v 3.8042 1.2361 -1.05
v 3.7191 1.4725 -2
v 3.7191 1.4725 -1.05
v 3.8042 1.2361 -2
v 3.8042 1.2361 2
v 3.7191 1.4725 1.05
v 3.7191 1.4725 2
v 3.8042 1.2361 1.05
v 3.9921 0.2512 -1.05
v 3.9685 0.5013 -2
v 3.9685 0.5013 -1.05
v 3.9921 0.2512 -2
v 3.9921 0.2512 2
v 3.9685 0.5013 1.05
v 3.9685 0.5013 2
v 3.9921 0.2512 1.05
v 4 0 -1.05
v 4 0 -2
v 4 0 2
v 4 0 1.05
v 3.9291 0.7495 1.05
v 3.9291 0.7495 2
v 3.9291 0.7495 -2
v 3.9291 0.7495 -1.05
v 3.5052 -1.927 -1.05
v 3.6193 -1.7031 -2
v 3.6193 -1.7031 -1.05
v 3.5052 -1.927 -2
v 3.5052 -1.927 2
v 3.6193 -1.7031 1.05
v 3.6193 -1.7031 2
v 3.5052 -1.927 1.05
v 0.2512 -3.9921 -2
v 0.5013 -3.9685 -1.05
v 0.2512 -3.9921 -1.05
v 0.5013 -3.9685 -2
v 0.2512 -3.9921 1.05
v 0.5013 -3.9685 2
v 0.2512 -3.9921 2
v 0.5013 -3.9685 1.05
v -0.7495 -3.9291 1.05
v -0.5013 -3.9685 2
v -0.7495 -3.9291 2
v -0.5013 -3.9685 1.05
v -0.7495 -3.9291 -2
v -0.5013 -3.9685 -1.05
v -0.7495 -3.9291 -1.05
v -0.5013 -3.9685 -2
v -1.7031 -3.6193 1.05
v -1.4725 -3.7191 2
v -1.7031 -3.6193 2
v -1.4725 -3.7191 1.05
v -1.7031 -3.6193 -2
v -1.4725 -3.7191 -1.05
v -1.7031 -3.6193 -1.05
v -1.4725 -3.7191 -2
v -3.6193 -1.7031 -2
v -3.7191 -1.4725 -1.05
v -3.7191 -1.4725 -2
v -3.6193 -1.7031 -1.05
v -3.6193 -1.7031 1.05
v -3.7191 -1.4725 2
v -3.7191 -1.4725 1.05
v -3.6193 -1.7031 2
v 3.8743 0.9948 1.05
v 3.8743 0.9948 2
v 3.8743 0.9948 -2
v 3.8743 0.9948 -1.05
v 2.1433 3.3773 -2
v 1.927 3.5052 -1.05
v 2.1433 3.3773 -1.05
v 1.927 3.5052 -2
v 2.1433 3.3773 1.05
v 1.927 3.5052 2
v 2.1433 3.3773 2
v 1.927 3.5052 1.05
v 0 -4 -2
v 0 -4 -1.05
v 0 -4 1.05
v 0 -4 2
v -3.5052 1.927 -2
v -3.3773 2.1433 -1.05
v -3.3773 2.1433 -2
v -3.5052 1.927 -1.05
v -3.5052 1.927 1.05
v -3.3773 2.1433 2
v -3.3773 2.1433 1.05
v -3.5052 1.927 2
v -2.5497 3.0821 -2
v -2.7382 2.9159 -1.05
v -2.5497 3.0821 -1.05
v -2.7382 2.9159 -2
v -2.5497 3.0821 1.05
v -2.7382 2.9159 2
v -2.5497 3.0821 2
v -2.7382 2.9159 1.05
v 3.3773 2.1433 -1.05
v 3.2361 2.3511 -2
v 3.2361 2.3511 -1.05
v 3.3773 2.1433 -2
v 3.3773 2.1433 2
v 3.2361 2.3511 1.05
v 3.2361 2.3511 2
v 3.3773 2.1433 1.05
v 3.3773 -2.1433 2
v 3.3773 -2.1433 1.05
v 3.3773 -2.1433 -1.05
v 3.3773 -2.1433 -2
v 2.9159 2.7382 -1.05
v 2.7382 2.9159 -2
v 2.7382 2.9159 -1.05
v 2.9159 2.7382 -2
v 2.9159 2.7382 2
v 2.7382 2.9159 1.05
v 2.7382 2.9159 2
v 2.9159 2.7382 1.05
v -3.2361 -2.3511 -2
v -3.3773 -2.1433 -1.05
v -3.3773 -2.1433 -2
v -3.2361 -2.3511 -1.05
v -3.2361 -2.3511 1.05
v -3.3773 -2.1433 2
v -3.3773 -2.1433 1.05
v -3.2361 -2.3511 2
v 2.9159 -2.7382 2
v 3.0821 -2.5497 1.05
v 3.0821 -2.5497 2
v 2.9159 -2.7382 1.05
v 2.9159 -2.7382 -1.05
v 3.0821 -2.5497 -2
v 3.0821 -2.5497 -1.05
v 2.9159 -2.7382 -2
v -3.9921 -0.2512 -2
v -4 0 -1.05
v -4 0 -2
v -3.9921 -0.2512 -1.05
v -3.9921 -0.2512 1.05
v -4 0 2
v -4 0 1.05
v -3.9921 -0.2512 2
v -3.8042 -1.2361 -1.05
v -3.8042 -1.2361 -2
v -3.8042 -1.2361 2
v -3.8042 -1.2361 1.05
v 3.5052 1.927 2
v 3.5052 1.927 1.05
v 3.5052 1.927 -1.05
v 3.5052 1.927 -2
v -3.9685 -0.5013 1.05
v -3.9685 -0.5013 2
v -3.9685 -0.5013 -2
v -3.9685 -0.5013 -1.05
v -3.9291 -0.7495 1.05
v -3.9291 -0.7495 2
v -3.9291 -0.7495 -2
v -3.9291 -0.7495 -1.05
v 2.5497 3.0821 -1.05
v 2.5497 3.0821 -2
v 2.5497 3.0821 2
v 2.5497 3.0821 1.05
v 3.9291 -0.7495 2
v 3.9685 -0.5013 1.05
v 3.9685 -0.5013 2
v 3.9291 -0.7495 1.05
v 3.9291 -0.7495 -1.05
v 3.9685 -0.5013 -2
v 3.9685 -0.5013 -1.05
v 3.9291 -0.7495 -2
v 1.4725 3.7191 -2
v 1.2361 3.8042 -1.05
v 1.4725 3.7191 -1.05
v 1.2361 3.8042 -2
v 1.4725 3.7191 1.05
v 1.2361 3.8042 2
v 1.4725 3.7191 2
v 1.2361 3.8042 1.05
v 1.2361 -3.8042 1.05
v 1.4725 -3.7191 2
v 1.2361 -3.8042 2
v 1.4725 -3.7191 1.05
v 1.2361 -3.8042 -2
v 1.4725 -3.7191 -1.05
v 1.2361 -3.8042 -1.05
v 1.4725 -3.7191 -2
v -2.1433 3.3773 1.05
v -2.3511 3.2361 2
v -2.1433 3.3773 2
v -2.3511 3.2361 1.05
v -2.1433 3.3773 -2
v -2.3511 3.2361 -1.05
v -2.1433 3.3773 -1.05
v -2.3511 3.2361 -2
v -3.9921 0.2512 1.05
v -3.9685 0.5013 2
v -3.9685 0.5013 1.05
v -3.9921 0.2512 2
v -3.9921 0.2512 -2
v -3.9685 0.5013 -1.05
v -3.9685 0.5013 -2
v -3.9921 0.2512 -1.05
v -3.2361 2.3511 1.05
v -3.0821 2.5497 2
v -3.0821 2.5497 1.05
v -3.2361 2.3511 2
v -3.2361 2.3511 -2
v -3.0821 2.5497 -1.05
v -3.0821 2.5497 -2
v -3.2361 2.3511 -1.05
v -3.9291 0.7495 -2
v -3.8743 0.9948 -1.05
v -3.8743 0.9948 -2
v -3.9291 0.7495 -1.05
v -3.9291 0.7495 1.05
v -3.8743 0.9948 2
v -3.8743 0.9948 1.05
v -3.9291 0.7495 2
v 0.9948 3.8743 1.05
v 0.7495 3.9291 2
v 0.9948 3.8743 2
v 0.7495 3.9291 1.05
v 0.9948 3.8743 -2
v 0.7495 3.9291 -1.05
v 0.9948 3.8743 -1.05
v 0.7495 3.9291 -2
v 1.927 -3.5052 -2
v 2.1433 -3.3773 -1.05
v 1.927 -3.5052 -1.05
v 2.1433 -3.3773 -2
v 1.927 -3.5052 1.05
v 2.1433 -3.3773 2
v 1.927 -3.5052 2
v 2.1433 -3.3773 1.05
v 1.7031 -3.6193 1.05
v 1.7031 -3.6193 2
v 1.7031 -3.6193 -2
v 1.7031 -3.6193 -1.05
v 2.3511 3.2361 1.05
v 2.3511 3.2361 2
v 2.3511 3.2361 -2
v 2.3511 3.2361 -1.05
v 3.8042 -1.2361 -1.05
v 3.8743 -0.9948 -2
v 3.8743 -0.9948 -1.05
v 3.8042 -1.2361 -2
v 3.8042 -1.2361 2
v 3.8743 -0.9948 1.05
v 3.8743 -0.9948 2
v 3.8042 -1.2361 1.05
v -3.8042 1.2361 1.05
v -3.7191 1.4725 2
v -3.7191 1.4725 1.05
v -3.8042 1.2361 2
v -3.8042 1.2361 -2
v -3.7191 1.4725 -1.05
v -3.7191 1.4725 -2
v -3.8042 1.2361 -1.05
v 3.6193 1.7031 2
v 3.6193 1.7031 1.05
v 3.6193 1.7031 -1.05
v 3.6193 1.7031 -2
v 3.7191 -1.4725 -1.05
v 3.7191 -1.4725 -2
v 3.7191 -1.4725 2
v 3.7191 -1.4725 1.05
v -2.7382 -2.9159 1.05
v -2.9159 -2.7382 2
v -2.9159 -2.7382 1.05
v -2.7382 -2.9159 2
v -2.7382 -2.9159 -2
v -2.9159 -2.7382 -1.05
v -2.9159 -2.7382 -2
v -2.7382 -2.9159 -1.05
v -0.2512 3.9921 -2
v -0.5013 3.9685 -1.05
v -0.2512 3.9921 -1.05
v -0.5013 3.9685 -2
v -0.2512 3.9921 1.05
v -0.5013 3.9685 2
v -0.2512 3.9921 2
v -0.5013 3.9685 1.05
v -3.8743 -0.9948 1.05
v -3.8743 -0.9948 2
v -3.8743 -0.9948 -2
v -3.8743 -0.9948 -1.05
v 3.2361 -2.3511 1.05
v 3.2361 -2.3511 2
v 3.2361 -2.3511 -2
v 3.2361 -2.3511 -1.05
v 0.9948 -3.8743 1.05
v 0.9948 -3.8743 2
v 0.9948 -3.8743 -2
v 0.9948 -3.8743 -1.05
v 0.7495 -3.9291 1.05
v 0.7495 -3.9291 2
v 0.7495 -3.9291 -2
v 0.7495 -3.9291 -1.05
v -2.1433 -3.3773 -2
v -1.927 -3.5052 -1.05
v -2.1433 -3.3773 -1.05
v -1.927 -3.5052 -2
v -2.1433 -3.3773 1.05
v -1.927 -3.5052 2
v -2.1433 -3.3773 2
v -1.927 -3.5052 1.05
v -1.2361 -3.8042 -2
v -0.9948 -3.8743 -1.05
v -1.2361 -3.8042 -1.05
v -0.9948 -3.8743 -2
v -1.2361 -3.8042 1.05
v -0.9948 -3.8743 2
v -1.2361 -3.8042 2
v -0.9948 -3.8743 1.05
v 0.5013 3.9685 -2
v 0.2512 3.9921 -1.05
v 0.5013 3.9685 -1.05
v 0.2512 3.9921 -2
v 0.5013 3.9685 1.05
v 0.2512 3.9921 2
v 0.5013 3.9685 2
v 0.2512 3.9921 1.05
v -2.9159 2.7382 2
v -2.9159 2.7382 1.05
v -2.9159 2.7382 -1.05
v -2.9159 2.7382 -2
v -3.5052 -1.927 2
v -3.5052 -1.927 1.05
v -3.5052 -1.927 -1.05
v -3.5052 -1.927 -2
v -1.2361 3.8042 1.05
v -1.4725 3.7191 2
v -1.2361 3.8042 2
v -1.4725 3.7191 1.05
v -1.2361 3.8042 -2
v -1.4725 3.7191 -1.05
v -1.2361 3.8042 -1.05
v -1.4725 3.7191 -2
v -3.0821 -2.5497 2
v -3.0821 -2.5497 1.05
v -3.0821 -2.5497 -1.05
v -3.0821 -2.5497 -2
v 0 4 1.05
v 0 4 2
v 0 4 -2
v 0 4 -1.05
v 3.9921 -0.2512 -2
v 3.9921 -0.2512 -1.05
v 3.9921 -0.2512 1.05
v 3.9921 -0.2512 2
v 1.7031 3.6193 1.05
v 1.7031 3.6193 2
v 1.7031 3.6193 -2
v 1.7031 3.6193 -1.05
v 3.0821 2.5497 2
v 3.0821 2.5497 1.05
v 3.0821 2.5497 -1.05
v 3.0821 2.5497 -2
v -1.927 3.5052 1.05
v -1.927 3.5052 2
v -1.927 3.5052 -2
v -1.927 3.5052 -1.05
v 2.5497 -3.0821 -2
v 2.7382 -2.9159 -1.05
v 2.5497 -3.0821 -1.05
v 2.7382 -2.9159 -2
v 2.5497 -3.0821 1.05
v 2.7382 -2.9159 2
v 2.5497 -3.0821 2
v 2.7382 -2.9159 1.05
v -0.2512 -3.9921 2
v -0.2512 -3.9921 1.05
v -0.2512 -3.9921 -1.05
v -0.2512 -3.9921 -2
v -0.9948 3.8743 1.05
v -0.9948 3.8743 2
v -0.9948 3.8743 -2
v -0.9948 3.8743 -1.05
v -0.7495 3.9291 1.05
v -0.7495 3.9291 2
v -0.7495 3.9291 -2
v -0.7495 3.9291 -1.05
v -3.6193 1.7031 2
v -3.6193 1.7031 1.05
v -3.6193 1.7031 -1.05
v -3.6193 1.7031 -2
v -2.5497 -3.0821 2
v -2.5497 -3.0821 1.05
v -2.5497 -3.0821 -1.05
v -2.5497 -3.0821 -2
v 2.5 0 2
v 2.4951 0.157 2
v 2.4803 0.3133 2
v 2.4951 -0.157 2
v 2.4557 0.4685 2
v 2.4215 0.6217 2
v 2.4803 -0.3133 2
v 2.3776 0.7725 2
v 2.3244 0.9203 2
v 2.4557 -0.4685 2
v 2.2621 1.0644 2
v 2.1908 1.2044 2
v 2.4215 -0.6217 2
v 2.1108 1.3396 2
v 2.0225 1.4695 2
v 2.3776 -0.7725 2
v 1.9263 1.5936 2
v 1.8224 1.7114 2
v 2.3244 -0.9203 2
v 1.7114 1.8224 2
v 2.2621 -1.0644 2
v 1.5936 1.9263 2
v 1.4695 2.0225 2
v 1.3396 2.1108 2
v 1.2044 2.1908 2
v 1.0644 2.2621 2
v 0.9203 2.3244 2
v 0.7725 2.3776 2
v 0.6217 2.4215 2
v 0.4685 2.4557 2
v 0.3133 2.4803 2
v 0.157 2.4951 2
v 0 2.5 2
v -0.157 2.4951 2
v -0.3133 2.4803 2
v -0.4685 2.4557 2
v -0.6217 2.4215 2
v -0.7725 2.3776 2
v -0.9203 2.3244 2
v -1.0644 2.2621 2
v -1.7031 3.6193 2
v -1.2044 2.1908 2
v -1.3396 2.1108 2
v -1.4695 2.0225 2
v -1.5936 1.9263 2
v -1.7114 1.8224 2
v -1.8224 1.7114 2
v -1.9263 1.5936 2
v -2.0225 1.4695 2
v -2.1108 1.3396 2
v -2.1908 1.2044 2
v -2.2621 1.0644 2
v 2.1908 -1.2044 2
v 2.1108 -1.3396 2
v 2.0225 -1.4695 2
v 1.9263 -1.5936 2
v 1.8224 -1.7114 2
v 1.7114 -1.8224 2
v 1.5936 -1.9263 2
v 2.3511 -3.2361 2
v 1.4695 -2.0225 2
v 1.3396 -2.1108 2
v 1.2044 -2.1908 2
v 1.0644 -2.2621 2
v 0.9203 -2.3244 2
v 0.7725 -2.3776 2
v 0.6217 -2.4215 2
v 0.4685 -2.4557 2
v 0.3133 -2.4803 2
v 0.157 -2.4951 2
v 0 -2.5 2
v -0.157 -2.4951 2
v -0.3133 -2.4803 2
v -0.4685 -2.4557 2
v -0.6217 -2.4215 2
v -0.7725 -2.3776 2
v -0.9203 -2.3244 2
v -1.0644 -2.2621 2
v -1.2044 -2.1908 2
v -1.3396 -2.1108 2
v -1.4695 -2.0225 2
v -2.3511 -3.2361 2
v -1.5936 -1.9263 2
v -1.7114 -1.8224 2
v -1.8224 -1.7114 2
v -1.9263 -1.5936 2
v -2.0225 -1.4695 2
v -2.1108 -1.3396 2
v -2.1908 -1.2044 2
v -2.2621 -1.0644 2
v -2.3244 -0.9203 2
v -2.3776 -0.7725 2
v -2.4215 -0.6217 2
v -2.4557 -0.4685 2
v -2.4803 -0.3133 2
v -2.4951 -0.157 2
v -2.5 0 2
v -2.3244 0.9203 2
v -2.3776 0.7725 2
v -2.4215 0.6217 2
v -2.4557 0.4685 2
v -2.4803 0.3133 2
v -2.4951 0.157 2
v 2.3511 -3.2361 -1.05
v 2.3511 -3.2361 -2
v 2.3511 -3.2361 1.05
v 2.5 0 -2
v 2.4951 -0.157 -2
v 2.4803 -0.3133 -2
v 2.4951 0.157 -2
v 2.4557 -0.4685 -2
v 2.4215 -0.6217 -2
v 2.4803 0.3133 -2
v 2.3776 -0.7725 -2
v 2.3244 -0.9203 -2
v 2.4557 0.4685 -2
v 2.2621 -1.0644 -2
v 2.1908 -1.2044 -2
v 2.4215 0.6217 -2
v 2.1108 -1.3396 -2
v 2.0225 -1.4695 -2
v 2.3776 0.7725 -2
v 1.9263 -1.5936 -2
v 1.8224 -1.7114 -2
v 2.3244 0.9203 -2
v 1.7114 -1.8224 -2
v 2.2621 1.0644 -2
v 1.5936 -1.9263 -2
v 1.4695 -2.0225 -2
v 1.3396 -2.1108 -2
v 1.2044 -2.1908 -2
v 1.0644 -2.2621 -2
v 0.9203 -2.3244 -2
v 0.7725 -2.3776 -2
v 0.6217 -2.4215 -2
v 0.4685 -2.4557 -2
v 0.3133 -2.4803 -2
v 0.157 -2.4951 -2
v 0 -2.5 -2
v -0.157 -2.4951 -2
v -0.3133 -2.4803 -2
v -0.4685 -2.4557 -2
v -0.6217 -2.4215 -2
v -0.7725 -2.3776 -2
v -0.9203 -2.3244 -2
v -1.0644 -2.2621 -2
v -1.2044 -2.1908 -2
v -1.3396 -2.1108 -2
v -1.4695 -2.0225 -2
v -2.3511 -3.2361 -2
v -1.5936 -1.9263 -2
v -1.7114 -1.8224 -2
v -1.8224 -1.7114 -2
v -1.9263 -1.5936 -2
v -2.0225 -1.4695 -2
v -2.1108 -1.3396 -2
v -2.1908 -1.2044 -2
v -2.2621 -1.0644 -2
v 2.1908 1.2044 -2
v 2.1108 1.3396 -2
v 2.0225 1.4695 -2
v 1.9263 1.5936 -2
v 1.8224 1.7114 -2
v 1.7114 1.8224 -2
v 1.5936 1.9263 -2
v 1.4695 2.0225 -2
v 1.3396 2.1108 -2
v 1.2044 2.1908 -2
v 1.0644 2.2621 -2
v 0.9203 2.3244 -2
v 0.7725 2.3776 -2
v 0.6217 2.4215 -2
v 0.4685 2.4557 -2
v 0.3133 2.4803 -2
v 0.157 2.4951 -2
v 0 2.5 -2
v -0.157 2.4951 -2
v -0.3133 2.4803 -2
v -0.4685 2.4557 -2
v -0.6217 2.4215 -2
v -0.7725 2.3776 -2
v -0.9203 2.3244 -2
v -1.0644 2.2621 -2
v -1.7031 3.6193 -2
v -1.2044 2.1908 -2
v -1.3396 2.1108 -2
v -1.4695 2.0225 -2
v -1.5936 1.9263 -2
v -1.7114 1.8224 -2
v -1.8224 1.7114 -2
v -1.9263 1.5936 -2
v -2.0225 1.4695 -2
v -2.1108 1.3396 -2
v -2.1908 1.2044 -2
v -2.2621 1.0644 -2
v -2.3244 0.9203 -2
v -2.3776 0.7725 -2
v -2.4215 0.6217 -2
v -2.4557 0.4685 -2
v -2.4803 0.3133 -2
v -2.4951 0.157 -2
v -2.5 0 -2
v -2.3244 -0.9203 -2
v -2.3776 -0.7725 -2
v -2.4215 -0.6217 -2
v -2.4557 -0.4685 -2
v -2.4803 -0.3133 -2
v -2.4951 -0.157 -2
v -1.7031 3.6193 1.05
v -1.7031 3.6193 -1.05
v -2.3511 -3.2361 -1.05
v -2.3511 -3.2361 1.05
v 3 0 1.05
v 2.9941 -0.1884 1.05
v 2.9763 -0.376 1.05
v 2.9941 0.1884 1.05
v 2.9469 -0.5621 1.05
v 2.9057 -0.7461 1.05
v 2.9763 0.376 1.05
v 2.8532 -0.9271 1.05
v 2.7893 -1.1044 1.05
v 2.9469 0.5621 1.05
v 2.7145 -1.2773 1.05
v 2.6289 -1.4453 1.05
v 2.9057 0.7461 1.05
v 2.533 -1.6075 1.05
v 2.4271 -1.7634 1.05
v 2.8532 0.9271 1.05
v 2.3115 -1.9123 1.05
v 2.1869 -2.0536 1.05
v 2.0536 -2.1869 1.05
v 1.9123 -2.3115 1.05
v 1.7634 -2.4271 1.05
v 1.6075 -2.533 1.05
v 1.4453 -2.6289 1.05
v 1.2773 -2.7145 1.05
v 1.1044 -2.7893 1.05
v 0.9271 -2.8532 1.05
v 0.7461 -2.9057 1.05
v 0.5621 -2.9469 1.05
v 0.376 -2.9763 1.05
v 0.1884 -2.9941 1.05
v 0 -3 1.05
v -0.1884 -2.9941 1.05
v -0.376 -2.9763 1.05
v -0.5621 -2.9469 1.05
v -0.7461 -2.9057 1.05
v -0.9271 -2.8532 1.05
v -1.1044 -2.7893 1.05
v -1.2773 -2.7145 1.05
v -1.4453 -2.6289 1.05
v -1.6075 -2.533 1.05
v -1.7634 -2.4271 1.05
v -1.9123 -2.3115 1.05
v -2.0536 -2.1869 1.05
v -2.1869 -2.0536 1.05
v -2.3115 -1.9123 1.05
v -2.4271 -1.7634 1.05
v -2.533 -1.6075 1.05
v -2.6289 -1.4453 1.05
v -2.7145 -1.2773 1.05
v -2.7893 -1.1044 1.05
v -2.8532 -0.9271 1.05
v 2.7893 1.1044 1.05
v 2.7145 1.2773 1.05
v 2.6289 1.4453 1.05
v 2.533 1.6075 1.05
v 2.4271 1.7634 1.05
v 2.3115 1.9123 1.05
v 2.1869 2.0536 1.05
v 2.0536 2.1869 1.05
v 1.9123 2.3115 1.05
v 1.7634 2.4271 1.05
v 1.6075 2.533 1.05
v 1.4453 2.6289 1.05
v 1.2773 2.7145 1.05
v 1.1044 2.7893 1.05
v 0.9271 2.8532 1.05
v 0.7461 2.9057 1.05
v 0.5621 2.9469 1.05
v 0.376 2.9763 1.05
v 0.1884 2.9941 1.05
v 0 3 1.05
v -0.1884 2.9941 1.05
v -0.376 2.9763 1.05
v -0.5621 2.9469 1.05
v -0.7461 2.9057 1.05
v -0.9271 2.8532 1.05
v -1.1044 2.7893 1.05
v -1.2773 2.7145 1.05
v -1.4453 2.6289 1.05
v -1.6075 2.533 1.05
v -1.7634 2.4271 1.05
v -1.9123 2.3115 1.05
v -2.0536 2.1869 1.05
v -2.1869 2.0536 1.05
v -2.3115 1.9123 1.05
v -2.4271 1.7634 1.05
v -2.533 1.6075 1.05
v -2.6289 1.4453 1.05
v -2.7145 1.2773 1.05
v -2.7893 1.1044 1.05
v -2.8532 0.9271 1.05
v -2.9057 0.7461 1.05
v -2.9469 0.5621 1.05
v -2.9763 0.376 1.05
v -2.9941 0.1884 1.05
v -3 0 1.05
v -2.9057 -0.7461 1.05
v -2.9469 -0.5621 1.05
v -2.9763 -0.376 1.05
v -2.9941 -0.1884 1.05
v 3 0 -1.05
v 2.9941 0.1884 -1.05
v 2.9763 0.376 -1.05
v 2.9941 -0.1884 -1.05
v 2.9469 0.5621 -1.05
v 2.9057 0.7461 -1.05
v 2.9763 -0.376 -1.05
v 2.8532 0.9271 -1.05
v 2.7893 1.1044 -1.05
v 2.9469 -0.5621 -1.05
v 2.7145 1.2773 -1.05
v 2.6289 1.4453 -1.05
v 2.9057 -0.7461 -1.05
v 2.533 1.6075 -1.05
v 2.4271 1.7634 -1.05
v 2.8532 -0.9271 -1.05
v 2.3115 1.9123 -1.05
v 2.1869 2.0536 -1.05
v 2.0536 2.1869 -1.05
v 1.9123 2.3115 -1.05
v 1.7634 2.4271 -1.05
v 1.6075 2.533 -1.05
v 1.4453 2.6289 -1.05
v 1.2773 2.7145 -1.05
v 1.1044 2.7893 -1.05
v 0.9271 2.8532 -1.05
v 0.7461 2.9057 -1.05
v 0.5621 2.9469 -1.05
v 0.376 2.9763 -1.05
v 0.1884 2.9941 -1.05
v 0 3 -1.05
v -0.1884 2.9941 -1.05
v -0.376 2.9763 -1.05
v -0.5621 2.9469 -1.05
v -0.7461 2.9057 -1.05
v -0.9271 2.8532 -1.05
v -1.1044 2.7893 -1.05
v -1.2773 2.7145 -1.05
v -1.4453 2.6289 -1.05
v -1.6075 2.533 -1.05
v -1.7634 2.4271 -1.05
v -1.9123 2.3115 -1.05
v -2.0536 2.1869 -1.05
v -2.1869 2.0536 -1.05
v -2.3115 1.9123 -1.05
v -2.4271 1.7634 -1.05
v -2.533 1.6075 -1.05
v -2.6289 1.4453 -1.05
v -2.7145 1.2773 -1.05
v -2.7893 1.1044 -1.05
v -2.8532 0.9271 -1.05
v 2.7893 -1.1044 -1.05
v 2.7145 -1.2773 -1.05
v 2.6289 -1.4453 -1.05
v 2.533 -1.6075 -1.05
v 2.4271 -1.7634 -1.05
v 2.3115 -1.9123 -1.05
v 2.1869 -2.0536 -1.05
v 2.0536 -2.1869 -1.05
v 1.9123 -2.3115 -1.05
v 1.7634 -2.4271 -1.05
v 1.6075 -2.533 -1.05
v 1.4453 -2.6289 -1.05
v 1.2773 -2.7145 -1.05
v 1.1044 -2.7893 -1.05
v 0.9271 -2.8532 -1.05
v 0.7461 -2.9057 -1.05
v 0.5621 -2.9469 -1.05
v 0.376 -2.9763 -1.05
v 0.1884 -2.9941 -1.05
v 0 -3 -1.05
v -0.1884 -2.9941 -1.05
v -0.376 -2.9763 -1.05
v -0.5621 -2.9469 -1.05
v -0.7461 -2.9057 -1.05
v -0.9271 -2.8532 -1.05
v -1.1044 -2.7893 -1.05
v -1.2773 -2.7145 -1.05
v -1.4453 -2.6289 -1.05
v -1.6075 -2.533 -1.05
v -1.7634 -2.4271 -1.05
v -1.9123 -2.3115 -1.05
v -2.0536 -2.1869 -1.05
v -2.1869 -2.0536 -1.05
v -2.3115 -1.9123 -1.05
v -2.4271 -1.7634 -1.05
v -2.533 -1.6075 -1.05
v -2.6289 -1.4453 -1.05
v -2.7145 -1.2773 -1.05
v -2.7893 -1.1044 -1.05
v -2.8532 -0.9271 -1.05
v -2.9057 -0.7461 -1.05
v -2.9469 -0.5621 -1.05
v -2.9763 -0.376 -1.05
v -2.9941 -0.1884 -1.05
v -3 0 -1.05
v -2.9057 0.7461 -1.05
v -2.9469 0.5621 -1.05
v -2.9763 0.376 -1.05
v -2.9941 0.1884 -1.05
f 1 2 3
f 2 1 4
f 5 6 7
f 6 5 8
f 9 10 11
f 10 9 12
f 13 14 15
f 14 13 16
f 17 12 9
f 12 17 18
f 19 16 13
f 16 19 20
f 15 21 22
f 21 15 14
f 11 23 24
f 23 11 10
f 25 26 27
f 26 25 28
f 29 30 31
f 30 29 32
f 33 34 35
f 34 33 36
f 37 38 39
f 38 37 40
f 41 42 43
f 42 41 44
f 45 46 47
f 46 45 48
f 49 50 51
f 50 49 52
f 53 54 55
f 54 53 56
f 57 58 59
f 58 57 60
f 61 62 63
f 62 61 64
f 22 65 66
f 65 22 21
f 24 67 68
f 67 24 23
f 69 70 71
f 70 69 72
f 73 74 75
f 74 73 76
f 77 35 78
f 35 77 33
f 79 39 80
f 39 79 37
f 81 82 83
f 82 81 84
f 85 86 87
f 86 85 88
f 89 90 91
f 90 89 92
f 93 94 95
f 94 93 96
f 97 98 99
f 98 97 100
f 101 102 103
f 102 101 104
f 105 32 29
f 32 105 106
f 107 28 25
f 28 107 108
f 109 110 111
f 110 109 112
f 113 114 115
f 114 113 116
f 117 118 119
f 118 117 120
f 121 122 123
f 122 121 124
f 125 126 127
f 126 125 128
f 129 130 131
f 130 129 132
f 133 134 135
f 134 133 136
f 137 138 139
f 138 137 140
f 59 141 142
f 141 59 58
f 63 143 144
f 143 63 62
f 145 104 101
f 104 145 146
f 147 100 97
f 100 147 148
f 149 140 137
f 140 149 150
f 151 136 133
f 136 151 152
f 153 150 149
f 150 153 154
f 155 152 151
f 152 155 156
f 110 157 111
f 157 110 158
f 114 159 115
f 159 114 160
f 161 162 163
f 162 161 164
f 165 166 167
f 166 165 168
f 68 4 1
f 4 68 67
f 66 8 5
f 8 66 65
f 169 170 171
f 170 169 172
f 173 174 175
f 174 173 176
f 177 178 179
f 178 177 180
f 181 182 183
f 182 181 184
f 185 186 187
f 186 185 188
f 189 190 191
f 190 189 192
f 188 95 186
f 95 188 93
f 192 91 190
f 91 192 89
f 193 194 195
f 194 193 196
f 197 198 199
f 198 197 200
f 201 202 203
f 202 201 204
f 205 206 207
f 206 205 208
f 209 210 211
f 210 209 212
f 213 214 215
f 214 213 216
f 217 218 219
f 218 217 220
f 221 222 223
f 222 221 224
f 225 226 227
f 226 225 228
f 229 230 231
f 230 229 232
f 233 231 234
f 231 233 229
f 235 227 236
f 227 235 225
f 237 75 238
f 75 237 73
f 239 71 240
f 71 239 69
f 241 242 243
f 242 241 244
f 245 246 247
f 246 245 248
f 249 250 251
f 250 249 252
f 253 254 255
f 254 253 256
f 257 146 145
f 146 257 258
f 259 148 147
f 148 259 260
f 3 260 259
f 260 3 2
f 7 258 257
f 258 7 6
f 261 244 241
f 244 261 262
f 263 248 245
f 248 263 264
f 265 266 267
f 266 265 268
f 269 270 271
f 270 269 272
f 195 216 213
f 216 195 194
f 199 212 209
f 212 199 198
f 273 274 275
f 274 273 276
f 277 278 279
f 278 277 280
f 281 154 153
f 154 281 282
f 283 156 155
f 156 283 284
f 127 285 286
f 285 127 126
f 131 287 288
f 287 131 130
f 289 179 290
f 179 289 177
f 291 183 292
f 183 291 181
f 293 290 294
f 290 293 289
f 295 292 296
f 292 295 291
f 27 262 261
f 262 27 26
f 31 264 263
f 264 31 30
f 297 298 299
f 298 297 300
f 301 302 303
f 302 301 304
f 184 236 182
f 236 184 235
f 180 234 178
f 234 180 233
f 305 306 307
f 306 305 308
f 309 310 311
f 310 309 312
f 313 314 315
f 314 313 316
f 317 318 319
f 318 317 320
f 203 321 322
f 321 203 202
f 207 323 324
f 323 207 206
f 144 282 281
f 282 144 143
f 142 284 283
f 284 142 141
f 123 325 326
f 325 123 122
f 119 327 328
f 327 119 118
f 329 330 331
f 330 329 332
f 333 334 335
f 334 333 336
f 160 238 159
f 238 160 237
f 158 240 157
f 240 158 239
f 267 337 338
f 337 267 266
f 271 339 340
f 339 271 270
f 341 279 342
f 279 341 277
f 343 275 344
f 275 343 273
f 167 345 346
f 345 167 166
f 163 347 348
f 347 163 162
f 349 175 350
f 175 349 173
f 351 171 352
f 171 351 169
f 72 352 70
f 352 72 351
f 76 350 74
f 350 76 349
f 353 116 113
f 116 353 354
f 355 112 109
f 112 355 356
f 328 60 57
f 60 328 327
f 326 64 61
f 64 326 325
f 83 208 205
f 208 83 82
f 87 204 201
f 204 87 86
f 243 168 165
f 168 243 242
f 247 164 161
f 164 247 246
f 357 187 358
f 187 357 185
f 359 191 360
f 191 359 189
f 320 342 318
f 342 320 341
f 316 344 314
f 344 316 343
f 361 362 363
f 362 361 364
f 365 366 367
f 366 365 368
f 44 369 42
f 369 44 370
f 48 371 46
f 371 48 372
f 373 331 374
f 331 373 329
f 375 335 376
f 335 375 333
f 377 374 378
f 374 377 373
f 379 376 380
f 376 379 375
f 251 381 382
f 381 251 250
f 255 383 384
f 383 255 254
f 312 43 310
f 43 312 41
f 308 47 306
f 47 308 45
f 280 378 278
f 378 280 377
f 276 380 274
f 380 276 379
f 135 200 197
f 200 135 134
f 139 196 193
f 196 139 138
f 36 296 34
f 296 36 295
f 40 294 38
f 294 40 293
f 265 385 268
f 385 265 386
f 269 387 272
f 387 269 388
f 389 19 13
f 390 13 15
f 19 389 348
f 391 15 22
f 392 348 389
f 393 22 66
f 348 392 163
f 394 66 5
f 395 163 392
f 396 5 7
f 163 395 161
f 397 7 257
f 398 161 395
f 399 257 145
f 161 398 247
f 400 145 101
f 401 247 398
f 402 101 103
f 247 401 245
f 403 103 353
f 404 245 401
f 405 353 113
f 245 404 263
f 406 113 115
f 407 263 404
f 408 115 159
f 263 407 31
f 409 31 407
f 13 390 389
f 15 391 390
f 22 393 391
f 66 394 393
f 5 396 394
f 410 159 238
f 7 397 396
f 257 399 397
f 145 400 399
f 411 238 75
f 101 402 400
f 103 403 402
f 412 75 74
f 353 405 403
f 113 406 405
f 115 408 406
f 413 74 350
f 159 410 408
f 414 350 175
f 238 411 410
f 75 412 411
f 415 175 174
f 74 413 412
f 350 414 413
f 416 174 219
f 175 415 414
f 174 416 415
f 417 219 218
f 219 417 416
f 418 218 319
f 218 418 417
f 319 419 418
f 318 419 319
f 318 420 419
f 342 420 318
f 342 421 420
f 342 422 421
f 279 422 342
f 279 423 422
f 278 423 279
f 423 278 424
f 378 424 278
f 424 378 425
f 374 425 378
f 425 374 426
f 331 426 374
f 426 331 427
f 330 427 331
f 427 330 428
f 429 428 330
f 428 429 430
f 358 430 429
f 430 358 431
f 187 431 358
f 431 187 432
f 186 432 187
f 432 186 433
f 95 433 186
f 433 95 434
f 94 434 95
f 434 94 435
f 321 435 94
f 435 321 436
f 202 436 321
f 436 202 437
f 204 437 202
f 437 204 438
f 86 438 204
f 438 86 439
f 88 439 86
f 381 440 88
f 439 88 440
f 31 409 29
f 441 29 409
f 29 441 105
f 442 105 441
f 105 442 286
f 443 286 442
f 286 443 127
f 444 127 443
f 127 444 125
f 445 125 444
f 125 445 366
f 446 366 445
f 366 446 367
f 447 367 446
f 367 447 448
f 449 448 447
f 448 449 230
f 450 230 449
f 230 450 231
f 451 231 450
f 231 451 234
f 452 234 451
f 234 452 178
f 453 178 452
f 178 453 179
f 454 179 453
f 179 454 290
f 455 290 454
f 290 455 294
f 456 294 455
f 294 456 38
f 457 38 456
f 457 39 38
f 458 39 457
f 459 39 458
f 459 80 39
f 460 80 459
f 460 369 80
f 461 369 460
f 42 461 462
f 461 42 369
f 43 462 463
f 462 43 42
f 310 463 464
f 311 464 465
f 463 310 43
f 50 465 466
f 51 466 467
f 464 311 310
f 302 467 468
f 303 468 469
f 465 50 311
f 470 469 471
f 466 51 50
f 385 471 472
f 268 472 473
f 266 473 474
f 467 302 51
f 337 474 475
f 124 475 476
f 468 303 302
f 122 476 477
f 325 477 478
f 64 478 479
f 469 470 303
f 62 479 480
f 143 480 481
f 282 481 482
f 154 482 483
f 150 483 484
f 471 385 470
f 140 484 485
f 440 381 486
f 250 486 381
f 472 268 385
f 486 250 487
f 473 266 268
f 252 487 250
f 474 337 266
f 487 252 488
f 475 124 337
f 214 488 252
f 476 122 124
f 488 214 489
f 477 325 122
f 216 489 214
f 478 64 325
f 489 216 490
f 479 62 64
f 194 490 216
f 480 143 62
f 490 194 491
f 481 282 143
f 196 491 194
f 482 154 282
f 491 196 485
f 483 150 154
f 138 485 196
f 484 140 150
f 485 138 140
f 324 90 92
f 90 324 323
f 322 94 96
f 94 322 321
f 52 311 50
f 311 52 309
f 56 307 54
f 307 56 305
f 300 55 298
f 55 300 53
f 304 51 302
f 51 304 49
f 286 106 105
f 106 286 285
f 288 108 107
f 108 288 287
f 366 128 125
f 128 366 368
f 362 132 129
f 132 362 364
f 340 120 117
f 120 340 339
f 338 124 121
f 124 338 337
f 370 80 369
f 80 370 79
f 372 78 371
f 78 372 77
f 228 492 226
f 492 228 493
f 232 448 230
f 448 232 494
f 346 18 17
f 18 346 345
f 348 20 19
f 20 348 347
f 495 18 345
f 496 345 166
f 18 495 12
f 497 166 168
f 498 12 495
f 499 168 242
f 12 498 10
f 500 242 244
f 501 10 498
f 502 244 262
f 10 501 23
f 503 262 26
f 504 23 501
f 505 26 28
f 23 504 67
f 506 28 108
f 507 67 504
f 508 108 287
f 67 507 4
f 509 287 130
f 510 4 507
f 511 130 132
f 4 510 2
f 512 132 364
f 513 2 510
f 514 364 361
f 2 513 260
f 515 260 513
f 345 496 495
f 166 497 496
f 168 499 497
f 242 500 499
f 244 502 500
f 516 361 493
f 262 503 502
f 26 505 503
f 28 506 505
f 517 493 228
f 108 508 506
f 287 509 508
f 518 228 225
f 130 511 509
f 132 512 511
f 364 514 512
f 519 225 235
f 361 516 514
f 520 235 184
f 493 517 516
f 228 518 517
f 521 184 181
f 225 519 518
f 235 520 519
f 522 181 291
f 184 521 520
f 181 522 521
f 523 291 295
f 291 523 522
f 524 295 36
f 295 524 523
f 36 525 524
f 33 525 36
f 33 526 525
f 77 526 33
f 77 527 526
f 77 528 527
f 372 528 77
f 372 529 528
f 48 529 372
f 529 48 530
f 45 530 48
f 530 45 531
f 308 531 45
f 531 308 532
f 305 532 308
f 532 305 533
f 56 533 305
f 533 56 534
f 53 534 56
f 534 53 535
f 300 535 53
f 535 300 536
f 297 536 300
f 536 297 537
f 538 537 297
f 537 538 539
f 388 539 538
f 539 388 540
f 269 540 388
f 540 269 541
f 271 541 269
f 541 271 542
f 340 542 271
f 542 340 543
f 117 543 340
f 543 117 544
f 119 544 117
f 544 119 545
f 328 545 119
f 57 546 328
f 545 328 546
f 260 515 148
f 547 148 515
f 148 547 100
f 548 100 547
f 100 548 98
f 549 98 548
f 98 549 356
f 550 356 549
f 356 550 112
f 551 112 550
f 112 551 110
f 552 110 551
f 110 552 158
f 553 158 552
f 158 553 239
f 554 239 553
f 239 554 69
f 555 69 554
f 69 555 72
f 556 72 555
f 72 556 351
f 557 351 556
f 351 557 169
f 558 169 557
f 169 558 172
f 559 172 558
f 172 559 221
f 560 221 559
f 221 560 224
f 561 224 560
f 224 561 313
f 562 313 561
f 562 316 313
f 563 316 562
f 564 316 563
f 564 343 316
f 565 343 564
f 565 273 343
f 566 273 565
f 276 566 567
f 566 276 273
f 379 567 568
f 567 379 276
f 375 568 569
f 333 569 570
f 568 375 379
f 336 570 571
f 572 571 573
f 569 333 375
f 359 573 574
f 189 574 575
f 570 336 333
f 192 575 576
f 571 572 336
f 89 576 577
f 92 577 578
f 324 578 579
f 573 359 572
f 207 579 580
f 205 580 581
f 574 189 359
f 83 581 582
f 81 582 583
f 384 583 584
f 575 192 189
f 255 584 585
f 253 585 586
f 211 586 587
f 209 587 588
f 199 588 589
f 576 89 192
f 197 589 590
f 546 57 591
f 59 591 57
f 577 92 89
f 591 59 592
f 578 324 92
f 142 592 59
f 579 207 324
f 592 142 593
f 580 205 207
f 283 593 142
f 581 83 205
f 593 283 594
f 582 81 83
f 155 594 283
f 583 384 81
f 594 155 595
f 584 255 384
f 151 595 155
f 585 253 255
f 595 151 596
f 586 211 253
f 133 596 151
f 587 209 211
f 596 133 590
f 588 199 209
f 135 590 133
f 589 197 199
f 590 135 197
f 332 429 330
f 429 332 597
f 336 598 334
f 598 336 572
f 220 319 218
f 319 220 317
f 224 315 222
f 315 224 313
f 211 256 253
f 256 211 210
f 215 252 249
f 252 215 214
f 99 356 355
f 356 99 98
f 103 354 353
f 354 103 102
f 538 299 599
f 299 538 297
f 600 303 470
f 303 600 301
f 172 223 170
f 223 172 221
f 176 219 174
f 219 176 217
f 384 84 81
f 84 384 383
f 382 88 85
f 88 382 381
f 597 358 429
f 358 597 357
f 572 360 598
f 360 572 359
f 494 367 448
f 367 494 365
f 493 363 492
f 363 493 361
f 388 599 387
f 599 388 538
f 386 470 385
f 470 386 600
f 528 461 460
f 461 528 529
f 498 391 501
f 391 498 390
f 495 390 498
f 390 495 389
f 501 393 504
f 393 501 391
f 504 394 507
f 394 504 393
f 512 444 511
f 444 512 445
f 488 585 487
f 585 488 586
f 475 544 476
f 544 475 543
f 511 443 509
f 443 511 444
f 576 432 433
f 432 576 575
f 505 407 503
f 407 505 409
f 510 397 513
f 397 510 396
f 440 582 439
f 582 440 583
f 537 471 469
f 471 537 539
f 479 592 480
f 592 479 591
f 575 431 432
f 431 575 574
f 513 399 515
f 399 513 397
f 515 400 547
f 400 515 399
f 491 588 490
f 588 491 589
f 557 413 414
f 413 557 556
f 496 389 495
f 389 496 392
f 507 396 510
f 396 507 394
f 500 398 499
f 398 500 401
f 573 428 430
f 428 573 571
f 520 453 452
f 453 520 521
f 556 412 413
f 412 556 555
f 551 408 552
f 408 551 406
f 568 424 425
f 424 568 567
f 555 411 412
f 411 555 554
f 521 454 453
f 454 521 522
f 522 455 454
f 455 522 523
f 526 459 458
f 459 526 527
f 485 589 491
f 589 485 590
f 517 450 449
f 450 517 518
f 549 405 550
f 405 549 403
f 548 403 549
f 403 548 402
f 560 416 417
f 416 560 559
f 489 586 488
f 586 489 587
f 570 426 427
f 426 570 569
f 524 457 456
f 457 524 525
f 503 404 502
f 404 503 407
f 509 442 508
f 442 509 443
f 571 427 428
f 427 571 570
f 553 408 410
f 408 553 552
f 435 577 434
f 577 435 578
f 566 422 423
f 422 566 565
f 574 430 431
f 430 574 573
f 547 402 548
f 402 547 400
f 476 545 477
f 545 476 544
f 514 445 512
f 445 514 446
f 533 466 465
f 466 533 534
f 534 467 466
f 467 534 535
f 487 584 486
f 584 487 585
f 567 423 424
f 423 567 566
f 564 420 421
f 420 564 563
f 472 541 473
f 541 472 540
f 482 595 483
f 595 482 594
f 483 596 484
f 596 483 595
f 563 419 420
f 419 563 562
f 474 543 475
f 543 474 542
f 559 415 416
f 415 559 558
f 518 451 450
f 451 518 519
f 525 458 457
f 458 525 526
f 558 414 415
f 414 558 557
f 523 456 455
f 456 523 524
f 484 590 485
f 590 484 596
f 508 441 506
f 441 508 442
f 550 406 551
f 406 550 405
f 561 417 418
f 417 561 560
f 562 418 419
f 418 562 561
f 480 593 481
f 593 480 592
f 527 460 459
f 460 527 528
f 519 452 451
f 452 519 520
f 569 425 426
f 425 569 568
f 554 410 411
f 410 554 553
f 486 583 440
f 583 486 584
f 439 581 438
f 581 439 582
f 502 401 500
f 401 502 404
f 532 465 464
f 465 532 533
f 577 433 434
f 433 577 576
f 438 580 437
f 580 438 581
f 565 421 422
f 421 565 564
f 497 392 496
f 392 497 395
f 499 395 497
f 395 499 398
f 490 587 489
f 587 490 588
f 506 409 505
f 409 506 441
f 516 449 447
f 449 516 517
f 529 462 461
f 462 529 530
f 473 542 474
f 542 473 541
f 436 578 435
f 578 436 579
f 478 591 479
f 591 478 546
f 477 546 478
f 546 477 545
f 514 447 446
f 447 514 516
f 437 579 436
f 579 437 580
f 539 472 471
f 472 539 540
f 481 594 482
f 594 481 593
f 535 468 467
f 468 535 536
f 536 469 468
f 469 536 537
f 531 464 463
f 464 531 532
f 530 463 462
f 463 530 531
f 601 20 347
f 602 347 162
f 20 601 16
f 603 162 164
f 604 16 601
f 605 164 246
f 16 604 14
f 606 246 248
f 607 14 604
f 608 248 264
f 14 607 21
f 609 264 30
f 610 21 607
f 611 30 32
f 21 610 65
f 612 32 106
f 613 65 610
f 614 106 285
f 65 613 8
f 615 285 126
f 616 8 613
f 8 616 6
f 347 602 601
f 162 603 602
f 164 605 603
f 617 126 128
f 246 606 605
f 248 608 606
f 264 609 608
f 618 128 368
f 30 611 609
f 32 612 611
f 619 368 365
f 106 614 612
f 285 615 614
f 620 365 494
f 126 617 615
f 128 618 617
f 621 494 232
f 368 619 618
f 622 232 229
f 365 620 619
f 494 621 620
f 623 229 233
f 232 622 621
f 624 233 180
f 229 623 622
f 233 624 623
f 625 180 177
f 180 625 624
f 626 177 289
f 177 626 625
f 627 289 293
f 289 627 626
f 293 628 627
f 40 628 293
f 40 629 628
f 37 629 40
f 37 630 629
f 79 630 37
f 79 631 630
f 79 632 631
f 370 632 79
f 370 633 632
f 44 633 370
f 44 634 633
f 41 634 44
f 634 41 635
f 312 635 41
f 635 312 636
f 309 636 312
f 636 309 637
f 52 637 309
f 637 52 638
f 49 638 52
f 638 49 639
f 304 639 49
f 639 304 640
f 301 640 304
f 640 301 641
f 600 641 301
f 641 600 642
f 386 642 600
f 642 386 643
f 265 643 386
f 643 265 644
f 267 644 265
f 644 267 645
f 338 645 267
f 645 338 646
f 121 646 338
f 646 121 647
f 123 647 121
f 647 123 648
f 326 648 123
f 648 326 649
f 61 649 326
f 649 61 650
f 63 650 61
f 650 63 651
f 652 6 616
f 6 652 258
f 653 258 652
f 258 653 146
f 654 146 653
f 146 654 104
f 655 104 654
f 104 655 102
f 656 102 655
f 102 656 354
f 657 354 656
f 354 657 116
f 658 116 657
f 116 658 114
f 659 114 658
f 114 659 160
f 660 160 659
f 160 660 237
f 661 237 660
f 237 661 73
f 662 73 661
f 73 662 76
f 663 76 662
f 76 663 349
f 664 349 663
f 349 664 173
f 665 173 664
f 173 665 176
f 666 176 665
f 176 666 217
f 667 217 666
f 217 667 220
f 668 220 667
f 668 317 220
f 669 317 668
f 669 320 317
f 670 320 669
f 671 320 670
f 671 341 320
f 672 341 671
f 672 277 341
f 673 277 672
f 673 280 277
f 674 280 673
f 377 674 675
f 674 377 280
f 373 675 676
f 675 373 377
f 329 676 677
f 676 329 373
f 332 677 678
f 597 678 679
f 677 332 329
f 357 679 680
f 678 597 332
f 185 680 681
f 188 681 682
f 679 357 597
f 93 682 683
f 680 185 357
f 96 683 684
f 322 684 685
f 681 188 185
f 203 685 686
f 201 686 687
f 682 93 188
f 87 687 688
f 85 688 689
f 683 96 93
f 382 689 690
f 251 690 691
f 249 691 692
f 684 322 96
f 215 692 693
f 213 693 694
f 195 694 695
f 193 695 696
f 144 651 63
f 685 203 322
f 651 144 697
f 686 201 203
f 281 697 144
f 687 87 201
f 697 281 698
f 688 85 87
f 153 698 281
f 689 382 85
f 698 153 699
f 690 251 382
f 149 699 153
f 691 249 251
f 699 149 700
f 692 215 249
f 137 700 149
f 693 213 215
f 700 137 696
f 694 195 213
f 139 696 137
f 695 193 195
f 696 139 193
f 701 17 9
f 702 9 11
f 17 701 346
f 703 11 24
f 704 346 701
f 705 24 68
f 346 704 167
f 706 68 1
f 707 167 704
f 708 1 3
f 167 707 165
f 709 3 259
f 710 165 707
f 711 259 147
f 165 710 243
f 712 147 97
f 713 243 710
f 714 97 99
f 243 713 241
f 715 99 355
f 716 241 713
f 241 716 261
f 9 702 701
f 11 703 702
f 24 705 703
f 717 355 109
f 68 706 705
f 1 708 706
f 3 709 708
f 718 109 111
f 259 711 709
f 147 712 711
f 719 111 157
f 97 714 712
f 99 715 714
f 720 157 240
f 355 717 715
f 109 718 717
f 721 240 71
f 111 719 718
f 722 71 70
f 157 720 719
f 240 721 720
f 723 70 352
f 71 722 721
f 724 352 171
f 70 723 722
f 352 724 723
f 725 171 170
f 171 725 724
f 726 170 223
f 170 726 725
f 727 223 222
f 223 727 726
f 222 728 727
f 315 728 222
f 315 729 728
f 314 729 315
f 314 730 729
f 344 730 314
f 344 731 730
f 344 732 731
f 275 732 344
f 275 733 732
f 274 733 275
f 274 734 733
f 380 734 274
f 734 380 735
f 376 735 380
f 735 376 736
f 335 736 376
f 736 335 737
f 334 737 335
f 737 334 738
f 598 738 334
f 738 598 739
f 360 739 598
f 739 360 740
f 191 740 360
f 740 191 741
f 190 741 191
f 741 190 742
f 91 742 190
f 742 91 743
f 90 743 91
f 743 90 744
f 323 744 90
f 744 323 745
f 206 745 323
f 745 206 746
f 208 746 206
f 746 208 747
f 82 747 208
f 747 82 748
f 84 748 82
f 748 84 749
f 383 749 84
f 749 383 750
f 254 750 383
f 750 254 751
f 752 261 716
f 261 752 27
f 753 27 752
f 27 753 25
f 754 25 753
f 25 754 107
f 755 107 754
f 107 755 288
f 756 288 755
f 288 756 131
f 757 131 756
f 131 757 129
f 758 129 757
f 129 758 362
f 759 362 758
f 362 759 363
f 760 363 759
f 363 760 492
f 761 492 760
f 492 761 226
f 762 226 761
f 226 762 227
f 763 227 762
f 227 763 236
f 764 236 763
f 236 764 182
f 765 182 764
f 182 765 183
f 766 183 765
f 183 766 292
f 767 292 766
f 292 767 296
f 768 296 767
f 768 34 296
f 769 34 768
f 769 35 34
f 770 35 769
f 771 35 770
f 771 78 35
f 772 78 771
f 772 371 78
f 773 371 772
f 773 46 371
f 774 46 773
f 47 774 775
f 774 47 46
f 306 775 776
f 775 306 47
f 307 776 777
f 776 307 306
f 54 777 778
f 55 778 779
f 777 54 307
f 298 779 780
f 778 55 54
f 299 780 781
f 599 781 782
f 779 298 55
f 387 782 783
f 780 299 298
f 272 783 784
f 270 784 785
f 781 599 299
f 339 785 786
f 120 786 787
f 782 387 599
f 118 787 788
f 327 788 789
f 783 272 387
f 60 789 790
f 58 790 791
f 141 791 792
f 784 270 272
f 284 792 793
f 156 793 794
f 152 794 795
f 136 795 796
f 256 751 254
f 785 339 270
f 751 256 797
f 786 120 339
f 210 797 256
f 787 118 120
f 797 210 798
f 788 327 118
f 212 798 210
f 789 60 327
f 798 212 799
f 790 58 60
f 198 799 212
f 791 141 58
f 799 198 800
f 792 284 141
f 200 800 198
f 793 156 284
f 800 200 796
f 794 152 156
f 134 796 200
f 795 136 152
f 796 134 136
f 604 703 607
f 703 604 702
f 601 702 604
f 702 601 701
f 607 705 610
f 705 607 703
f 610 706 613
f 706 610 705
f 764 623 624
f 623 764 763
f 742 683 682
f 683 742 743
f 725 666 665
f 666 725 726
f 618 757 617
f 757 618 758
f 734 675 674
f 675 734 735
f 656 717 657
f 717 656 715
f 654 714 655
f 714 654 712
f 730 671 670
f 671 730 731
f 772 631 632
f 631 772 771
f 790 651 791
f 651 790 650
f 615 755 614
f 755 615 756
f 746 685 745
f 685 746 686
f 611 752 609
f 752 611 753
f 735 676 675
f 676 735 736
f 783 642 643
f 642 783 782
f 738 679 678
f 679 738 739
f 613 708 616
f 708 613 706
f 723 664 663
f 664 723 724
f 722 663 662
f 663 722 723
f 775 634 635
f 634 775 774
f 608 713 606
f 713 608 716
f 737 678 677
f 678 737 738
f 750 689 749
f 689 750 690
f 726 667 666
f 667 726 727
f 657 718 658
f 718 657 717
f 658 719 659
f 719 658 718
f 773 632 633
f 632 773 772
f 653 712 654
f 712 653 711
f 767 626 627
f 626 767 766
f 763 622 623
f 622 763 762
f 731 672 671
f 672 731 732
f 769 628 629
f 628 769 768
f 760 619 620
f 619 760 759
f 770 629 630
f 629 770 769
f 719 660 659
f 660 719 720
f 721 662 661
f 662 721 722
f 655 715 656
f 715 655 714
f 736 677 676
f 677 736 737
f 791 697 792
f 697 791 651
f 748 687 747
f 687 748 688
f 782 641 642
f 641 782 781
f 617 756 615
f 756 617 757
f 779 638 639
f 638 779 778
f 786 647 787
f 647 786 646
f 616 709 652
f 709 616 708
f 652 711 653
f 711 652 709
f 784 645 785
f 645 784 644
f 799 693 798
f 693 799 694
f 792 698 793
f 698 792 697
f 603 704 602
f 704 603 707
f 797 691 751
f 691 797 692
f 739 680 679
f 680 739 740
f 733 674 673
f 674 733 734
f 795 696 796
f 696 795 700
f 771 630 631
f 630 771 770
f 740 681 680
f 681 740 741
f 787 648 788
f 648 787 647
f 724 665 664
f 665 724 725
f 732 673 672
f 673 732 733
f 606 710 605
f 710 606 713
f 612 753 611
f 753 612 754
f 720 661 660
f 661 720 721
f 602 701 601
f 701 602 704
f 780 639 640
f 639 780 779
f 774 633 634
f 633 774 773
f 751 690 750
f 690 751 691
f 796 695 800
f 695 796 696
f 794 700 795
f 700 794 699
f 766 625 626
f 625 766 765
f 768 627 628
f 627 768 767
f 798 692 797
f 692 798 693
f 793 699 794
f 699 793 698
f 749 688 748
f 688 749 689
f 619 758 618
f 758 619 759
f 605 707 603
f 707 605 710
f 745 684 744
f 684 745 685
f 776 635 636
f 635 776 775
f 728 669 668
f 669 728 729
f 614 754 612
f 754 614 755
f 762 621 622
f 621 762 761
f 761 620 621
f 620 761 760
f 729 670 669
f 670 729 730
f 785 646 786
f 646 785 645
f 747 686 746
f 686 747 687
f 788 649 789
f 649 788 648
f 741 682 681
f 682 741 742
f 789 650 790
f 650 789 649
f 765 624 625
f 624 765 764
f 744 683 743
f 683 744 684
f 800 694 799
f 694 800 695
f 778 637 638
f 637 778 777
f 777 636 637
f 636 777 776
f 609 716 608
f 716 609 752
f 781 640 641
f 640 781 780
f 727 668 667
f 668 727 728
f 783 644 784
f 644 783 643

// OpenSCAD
module ring(r1,r2,h){
    difference(){
    cylinder(r=r1,h=h, $fn=100,center=true);
        cylinder(r=r2,h=h*2, $fn=100,center=true);
    }
}


difference(){
    ring(4, 2.5, 4);
    ring(10,3,2.1);
}
